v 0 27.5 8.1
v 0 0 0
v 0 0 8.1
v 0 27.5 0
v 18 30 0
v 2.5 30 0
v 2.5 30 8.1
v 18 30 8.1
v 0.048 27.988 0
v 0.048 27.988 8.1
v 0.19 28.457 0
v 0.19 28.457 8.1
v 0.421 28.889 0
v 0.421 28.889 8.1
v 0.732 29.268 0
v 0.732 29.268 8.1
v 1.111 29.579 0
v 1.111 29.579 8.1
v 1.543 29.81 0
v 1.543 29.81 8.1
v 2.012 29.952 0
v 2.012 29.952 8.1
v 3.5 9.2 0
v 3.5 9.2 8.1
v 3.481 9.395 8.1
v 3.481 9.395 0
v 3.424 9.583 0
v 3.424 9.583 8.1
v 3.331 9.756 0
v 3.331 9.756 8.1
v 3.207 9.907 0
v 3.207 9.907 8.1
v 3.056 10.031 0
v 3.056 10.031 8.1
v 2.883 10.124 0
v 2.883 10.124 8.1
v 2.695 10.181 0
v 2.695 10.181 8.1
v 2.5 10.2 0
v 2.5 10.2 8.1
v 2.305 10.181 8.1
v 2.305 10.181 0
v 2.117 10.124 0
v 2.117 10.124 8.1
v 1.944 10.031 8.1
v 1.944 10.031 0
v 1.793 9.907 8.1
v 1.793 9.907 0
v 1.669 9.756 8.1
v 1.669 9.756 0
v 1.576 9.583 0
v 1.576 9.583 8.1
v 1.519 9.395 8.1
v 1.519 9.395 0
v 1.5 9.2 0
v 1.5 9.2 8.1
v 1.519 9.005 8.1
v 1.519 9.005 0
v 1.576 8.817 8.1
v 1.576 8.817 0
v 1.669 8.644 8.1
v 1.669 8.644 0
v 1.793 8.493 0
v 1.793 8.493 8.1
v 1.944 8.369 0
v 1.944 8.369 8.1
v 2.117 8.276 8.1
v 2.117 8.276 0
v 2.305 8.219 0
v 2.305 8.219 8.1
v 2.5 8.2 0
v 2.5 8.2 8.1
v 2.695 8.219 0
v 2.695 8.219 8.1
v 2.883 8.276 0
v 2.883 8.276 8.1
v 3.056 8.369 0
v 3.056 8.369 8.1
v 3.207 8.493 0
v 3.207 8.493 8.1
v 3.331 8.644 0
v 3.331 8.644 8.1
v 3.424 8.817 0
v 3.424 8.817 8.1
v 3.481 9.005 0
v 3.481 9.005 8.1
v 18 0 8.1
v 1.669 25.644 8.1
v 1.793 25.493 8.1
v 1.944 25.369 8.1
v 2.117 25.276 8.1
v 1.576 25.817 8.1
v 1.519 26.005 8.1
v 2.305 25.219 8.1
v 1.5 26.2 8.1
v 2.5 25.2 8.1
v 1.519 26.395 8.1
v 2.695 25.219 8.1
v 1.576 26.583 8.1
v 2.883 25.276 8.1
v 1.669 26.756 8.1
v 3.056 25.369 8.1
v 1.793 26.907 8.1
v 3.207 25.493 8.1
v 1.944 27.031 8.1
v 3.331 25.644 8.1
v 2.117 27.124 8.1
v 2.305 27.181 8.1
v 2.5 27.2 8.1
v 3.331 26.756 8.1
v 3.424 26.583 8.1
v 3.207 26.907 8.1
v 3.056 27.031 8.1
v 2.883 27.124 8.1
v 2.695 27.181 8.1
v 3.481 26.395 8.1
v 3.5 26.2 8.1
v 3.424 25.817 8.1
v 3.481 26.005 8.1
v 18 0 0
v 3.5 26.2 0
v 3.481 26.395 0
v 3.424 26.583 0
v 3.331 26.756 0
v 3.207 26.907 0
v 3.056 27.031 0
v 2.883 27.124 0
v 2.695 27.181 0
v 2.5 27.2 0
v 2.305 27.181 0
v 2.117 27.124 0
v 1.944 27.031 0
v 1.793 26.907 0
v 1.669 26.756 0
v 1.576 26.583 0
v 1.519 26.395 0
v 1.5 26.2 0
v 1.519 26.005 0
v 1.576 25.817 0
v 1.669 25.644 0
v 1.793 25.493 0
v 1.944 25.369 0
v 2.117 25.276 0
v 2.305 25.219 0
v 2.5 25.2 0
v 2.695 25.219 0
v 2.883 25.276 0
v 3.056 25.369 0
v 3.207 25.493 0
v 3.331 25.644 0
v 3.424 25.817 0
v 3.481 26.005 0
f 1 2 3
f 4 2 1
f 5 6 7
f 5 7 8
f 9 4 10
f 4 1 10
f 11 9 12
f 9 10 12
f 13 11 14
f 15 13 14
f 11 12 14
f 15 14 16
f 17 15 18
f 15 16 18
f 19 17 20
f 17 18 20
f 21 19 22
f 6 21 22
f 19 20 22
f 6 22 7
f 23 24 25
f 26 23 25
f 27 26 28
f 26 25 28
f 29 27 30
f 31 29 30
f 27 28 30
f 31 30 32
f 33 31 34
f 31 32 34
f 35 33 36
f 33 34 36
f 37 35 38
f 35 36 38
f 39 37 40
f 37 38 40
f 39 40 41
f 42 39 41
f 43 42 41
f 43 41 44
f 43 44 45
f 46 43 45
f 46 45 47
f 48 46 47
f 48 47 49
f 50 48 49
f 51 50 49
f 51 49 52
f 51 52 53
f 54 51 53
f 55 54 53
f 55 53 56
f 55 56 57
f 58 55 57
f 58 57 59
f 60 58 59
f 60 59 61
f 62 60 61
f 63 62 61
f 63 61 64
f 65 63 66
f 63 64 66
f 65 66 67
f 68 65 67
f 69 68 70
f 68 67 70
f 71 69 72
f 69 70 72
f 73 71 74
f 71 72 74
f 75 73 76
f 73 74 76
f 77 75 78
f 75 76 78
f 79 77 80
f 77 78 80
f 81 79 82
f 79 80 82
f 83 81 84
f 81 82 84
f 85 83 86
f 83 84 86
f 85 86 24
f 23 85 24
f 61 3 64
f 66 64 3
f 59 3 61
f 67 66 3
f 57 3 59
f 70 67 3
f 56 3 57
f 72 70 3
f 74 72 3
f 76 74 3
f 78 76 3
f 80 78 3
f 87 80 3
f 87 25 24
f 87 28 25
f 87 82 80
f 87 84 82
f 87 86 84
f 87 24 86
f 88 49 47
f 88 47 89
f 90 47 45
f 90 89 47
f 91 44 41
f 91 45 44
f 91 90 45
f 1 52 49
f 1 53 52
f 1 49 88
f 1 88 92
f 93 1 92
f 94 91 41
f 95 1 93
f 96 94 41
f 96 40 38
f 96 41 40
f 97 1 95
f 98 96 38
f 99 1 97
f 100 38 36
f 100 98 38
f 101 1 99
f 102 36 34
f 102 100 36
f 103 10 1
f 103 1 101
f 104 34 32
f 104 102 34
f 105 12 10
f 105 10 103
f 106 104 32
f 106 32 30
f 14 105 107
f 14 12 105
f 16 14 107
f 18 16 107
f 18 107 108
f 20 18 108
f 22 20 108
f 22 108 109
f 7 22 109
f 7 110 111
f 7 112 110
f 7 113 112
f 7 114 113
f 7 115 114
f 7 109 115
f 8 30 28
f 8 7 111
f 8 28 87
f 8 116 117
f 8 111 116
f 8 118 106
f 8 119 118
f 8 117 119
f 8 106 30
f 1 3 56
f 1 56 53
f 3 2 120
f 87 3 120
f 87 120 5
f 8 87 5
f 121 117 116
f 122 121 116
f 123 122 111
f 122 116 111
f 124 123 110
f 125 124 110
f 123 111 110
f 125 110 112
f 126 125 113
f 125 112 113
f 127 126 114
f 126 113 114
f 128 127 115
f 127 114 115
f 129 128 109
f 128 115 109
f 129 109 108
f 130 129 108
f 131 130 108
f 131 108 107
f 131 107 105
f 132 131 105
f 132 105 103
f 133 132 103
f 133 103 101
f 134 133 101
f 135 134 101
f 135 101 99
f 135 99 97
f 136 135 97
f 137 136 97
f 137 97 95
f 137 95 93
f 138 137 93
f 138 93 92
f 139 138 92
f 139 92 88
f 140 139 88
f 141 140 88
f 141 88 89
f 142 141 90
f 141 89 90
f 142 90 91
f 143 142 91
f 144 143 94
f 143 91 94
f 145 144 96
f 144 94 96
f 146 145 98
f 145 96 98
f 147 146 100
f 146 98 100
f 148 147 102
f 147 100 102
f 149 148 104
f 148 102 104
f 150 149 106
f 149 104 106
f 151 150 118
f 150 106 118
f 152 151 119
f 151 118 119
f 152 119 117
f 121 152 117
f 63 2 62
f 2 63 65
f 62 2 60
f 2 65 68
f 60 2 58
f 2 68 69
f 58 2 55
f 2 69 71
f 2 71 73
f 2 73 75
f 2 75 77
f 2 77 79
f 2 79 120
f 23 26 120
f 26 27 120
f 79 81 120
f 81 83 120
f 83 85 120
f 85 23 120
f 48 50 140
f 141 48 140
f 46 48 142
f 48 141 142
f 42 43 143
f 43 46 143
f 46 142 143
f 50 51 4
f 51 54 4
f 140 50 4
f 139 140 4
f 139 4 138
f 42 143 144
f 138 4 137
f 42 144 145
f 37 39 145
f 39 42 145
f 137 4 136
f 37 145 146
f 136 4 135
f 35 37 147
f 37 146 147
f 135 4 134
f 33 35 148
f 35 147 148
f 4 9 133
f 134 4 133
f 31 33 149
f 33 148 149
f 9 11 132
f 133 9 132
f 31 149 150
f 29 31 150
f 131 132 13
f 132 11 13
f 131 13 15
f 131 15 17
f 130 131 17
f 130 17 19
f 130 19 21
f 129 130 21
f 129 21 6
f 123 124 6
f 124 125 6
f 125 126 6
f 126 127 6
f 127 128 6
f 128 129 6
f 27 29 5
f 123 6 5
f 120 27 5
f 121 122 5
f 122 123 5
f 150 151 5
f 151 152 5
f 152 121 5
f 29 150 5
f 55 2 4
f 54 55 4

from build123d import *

# Parameters (mm, degrees)
ESQUISSE1_W             = 18
ESQUISSE1_H             = 30
BOSS_EXTRU_1_DEPTH      = 8.1
ESQUISSE3_R             = 1
ENL_V_MAT_EXTRU_1_DEPTH = 36.911140333
CONG_1_R                = 2.5


with BuildPart() as part:
    # Esquisse1 → Boss.-Extru.1 (new body)
    with BuildSketch(Plane.XY):
        with Locations((9, 15)):
            Rectangle(ESQUISSE1_W, ESQUISSE1_H)
    extrude(amount=BOSS_EXTRU_1_DEPTH)

    # Esquisse3 → Enlèv. mat.-Extru.1 (cut, through all)
    with BuildSketch(Plane.XY.offset(8.1)):
        with Locations((2.5, 26.2)):
            Circle(ESQUISSE3_R)
        with Locations((2.5, 9.2)):
            Circle(ESQUISSE3_R)
    extrude(amount=-ENL_V_MAT_EXTRU_1_DEPTH, mode=Mode.SUBTRACT)

    # Congé1
    cong_1_edges = [part.edges().sort_by_distance(p)[0] for p in [
        (0, 30, 4.05),
    ]]
    fillet(cong_1_edges, radius=CONG_1_R)


solid = part.part
